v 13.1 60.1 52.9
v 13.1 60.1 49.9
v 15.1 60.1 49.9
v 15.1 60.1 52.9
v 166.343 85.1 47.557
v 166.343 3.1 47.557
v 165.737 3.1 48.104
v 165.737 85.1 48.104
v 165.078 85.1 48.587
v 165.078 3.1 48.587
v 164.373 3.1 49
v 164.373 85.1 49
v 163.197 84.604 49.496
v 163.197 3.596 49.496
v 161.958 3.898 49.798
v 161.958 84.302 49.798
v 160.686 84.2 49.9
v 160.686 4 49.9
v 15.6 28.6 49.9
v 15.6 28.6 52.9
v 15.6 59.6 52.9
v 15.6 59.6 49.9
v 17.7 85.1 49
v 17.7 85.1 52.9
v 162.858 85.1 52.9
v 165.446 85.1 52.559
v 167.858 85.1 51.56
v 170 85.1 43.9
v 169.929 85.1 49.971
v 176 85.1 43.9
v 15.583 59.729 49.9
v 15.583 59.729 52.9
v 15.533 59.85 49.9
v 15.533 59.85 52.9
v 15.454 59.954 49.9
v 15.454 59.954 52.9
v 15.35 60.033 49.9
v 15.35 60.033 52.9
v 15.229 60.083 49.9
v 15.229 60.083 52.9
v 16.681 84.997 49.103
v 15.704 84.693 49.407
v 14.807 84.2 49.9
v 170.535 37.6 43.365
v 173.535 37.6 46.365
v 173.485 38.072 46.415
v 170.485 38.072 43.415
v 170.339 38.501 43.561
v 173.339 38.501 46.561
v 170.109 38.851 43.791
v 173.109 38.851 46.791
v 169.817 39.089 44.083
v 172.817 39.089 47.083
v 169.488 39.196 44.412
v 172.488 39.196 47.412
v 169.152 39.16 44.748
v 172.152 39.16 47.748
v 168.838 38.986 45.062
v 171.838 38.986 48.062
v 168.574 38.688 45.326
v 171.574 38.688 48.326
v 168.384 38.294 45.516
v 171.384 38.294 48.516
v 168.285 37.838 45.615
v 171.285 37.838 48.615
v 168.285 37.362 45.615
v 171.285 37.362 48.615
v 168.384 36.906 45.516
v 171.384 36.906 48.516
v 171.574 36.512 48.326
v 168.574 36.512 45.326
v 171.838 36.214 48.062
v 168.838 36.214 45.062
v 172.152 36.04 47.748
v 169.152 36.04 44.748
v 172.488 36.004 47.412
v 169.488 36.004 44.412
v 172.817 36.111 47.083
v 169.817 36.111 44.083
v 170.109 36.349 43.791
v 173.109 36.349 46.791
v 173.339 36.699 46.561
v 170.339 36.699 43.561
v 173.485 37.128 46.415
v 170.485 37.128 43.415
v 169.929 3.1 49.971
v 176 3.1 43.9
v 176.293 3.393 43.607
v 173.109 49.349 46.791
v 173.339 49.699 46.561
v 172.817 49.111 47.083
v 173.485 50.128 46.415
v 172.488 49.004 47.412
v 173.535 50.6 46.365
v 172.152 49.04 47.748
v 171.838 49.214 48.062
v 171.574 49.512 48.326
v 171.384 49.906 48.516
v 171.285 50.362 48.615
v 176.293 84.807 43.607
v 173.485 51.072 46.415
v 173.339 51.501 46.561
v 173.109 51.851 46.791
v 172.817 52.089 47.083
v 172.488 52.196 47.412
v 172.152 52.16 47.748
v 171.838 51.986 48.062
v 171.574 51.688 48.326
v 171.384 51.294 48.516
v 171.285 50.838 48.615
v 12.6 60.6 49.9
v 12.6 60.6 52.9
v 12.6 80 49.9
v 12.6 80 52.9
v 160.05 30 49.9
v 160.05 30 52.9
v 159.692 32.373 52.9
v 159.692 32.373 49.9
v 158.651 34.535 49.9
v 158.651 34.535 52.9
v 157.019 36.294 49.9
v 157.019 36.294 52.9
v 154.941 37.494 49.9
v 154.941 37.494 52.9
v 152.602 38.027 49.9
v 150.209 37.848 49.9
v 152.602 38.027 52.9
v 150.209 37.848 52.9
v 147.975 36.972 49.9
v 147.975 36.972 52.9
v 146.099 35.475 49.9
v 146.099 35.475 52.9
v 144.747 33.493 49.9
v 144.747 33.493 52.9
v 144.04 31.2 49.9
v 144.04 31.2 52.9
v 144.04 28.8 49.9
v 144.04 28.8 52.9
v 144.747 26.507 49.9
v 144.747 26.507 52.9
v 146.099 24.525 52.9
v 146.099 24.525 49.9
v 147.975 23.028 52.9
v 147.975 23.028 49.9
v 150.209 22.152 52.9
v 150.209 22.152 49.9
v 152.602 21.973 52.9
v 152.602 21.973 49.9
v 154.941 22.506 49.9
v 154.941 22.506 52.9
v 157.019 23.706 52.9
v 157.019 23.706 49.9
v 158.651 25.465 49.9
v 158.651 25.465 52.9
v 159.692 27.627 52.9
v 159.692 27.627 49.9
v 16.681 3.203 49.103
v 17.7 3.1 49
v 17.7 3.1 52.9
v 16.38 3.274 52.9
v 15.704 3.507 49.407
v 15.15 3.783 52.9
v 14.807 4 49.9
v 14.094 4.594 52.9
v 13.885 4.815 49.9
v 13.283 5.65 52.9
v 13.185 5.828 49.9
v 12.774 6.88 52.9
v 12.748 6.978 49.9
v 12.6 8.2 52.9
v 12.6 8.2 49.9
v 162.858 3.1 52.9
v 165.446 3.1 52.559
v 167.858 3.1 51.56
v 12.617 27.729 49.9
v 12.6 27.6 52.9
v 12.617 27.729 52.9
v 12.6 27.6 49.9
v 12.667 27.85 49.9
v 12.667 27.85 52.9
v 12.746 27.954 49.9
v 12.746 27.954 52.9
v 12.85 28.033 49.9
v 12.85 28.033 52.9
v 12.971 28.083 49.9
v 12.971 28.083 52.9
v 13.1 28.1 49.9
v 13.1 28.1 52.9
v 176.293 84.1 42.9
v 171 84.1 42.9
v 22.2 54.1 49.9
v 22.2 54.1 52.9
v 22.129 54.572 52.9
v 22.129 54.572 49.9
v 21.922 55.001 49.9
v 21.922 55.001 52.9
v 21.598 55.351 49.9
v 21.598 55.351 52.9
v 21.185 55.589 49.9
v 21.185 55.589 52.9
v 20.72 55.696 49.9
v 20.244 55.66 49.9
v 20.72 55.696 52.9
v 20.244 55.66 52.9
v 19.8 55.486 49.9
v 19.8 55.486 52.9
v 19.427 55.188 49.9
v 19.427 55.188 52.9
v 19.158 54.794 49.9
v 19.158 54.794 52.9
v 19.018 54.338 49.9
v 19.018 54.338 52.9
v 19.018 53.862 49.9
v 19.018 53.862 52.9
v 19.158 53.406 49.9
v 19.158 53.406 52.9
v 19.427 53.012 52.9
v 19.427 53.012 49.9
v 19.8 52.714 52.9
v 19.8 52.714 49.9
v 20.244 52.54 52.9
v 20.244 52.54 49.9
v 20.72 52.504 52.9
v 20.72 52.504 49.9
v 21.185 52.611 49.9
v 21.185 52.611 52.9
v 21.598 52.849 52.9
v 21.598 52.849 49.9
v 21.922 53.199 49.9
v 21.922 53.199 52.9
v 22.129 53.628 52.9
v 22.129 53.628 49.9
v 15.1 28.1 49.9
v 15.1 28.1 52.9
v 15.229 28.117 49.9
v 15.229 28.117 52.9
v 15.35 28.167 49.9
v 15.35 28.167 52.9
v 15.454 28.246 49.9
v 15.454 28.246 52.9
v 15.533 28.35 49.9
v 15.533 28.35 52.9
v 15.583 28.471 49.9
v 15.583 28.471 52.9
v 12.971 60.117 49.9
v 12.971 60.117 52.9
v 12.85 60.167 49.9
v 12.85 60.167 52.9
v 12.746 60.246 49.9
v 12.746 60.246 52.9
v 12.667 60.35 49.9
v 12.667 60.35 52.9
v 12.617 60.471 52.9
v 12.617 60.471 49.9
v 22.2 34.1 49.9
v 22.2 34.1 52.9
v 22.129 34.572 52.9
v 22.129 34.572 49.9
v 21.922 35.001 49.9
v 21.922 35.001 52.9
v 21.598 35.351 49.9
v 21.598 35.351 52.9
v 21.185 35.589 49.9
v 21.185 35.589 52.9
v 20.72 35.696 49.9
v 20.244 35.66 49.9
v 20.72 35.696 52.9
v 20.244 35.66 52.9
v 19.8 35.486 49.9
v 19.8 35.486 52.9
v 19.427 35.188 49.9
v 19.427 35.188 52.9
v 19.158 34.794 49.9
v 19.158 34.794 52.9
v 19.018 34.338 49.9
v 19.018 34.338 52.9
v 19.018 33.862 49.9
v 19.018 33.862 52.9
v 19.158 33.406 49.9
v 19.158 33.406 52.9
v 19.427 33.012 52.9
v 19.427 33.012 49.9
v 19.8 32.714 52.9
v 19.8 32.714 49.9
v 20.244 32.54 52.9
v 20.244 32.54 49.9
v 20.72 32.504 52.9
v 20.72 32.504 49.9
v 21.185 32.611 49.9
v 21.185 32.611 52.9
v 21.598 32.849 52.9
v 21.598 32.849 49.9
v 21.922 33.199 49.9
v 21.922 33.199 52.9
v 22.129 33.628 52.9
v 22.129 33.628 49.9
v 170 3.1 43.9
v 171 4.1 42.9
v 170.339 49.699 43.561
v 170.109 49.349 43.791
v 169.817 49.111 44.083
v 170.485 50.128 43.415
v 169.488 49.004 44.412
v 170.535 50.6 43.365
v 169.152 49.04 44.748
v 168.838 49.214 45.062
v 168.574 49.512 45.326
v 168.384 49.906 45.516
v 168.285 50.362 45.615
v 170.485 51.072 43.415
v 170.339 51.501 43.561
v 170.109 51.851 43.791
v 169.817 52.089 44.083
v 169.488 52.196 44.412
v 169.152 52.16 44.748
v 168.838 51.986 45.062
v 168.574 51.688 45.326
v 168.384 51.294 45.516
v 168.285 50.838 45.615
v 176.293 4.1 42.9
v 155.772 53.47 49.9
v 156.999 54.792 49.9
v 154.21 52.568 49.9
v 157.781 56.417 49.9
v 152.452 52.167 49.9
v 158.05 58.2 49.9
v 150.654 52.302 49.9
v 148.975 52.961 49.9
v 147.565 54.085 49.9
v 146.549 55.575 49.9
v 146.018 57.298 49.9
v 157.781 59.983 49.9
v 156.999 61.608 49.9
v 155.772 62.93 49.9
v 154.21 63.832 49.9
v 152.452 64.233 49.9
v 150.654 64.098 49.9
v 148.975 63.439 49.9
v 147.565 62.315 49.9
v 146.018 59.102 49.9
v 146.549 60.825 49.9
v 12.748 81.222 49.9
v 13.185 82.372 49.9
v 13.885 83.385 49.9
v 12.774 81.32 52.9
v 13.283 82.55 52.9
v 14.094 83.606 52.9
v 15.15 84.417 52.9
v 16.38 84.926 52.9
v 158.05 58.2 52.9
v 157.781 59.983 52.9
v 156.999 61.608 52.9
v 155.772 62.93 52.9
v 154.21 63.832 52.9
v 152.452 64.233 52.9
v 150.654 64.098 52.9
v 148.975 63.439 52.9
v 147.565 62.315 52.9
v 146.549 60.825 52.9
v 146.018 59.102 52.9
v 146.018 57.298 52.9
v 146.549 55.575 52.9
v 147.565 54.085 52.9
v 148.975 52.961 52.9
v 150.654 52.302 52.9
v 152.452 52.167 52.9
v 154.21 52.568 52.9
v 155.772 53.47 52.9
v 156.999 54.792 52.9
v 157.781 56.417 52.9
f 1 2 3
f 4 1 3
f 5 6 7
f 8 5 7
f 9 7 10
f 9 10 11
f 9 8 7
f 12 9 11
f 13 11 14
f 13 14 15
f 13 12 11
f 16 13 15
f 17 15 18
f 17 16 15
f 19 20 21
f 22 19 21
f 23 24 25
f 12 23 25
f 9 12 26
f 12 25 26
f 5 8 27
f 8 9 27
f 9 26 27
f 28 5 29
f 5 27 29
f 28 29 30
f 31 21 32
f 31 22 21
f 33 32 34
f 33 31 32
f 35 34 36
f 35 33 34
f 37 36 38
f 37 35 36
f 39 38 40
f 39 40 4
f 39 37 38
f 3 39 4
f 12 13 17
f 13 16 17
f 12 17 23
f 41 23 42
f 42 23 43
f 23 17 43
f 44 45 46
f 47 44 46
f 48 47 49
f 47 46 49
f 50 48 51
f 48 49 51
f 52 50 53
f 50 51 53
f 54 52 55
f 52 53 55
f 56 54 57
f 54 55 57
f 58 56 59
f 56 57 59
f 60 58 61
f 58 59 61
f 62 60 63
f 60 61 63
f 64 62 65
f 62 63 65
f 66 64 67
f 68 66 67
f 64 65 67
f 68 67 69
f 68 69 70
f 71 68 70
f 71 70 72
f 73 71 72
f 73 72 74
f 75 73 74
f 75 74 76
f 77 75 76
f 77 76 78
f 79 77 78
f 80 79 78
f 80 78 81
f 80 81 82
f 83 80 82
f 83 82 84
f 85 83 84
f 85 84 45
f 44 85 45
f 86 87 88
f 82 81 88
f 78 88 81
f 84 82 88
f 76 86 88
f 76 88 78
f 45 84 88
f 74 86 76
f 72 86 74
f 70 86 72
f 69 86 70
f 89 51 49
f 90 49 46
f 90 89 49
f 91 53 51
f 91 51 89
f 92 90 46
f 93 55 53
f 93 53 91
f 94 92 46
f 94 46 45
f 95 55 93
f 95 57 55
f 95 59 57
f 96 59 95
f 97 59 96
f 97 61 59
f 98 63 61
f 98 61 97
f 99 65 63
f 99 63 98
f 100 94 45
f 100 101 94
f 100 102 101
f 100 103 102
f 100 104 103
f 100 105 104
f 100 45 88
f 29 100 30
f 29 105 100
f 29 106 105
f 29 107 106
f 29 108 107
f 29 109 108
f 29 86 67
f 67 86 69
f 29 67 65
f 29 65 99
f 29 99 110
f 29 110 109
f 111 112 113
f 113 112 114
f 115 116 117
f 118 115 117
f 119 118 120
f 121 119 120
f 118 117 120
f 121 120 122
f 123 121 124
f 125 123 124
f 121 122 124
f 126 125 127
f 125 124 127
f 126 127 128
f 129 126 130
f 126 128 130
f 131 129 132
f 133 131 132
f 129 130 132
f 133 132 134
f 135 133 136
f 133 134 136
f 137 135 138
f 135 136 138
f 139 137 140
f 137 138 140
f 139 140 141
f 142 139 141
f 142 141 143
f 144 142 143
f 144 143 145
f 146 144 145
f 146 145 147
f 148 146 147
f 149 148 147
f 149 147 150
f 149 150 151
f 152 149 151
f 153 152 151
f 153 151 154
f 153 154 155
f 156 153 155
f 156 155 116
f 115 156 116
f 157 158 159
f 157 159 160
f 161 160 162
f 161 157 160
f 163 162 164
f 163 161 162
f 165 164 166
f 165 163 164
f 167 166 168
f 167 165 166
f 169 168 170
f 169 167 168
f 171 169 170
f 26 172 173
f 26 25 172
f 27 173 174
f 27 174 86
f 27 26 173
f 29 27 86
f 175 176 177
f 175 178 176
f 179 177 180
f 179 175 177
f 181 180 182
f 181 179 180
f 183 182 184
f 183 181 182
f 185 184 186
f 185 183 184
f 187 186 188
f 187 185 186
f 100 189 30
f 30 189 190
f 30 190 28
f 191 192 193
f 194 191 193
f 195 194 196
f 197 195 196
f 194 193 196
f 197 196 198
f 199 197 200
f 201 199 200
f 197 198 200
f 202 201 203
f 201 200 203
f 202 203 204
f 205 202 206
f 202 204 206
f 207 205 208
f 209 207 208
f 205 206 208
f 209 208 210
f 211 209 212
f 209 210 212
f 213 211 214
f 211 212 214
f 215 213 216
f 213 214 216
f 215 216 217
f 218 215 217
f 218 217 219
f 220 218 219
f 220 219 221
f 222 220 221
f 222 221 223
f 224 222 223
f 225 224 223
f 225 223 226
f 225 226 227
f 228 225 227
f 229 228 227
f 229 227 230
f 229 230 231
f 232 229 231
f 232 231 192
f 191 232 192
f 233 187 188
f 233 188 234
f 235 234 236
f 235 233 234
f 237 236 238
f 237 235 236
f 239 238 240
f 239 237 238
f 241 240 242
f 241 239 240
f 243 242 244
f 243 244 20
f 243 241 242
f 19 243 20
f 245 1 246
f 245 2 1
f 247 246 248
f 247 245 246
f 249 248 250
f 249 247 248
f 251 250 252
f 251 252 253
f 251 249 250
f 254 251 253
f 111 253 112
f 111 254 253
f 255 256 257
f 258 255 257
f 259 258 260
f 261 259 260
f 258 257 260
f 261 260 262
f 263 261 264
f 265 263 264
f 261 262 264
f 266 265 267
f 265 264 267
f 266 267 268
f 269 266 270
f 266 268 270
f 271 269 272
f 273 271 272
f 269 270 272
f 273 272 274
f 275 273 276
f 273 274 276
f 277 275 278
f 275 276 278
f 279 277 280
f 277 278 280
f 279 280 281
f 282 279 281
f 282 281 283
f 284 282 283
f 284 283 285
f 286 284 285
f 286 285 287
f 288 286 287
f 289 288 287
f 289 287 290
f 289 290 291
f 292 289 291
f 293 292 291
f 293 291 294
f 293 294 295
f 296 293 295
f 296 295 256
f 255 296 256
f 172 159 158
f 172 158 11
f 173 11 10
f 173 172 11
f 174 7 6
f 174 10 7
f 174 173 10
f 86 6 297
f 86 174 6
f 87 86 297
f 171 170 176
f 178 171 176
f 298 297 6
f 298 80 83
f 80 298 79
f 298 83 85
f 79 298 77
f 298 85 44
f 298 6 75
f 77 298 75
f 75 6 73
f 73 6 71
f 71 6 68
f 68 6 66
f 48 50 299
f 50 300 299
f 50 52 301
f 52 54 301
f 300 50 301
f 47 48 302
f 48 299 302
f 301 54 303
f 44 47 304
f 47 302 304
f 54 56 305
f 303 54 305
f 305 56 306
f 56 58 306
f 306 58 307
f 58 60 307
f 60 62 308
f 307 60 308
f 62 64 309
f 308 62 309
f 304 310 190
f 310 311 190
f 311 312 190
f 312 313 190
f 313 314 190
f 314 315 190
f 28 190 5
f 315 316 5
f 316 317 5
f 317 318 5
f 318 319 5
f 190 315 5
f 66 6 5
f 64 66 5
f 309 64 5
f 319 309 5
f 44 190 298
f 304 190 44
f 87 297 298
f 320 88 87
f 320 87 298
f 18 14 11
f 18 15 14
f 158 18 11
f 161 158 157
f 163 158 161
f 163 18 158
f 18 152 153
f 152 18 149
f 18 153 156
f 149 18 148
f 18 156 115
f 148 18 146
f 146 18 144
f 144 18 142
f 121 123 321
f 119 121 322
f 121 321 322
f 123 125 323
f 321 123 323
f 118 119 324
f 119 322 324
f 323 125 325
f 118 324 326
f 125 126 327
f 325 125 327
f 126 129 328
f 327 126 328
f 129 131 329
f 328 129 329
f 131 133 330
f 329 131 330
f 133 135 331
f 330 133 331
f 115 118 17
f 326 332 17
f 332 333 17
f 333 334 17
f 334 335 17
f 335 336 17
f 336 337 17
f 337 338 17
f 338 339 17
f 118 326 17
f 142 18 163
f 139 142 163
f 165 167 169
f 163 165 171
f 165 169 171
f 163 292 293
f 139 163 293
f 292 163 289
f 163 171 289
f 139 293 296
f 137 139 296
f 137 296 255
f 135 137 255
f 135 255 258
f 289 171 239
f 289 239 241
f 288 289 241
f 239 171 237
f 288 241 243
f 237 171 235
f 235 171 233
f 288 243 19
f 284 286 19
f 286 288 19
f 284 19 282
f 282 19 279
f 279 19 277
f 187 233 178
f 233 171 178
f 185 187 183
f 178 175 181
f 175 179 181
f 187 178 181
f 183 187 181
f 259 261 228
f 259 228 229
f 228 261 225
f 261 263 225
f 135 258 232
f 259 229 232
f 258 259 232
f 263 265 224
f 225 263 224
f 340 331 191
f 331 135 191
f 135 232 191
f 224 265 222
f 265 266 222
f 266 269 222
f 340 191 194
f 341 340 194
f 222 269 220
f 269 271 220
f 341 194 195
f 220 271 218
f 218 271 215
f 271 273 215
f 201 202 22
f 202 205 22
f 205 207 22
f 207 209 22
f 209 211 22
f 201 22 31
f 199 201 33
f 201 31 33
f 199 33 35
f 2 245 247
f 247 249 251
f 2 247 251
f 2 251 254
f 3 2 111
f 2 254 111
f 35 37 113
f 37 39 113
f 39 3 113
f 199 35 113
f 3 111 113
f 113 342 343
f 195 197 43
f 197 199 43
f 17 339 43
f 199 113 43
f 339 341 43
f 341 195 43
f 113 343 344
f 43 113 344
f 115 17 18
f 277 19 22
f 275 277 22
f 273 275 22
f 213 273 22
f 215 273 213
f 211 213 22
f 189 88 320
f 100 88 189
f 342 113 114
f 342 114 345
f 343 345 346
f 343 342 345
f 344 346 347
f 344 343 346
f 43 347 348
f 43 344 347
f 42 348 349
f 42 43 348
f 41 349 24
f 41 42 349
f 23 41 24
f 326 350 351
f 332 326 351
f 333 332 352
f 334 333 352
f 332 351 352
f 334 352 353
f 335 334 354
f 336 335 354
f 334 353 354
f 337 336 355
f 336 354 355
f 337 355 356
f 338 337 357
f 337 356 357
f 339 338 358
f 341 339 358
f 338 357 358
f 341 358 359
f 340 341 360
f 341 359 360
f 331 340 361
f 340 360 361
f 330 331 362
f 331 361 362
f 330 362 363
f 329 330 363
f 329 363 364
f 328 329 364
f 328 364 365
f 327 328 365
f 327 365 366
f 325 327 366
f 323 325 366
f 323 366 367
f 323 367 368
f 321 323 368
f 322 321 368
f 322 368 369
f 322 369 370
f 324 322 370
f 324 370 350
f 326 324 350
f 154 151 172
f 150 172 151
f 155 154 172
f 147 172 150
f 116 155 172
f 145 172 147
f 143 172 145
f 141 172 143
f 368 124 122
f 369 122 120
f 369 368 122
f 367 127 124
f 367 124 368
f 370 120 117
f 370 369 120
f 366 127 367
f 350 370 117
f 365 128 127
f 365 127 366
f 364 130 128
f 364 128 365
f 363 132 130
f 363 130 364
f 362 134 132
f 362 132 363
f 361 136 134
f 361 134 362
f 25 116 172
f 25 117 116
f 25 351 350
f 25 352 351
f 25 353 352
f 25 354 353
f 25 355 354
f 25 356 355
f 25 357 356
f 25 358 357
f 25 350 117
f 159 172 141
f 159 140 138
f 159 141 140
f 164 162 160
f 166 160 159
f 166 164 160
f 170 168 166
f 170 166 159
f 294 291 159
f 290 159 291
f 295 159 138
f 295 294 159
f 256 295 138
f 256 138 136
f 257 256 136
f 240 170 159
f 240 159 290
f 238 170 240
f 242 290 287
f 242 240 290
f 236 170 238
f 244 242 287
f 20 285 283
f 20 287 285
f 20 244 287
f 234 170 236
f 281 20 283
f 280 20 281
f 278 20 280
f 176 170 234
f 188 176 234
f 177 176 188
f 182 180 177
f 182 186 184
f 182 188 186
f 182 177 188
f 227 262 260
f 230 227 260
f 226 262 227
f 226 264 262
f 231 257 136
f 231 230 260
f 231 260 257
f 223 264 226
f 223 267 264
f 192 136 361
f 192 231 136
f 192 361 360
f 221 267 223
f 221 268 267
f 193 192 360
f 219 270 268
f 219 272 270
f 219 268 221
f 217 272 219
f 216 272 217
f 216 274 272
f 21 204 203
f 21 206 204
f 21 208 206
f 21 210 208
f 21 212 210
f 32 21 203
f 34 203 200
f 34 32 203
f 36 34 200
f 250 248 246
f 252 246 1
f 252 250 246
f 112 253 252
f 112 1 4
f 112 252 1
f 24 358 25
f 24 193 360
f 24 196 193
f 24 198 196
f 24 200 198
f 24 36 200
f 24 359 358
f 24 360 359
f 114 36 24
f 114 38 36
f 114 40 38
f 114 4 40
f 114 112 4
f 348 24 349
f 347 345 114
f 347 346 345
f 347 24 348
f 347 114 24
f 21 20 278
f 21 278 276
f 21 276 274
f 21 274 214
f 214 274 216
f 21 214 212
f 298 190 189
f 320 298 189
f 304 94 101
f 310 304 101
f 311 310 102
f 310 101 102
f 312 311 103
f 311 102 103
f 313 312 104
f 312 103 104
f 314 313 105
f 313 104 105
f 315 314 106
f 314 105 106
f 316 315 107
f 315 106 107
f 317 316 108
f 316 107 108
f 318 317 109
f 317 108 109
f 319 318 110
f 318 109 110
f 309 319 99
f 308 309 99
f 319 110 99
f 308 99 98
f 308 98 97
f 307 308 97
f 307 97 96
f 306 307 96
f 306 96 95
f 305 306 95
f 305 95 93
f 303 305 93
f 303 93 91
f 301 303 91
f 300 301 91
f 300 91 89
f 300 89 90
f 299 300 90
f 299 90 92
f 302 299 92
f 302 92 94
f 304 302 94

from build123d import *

# Parameters (mm, degrees)
SKETCH_1_W            = 88.2
SKETCH_1_H            = 177
EXTRUDE_1_DEPTH       = 52.9
SHELL_1_T             = -3
CUT_EXTRUDE_5_REACH   = 206.711
SKETCH_16_R           = 6.05
SKETCH_16_R_2         = 8.05
CHAMFER_7_SIZE        = 10
CHAMFER_8_SIZE        = 1
SKETCH_21_W           = 10.5
SKETCH_21_H           = 82.2
EXTRUDE_7_DEPTH       = 6
SKETCH_22_OUTSIDE_W   = 219.942
SKETCH_22_OUTSIDE_H   = 131.142
SKETCH_22_OUTSIDE_W_2 = 164.4
SKETCH_22_OUTSIDE_H_2 = 82
CUT_EXTRUDE_8_DEPTH   = 10
SKETCH_23_W           = 177
SKETCH_23_H           = 42.9
CUT_EXTRUDE_9_DEPTH   = 205.711137948
FILLET_3_R            = 10
FILLET_4_R            = 5.1
SKETCH_24_R           = 1.6
CUT_EXTRUDE_10_DEPTH  = 146.652789194
CHAMFER_10_SIZE       = 1
CHAMFER_10_SIZE_2     = 0.707106781
CUT_EXTRUDE_11_REACH  = 198.013
SKETCH_25_R           = 1.6
FILLET_5_R            = 8
CUT_EXTRUDE_12_REACH  = 198.013
SKETCH_26_W           = 3
SKETCH_26_H           = 32
FILLET_6_R            = 0.5


with BuildPart() as part:
    # 草图1 → 凸台-拉伸1 (new body)
    with BuildSketch(Plane(origin=(0, 0, 0), x_dir=(0, 1, 0), z_dir=(0, 0, 1))):
        with Locations((44.1, -88.5)):
            Rectangle(SKETCH_1_W, SKETCH_1_H)
    extrude(amount=EXTRUDE_1_DEPTH)

    # 抽壳1
    shell_1_openings = [part.faces().sort_by_distance(p)[0] for p in [
        (88.5, 44.1, 0),
    ]]
    offset(amount=SHELL_1_T, openings=shell_1_openings, kind=Kind.INTERSECTION)

    # 草图16 → 切除-拉伸5 (cut, up to next)
    with BuildSketch(Plane.XY.offset(52.9), mode=Mode.PRIVATE) as cut_extrude_5_sk1:
        with Locations((152, 58.2)):
            Circle(SKETCH_16_R)
    cut_extrude_5_tool1 = extrude(cut_extrude_5_sk1.sketch, amount=-CUT_EXTRUDE_5_REACH, mode=Mode.PRIVATE) & part.part
    # 草图16 → 切除-拉伸5 (cut, up to next)
    with BuildSketch(Plane.XY.offset(52.9), mode=Mode.PRIVATE) as cut_extrude_5_sk2:
        with Locations((152, 30)):
            Circle(SKETCH_16_R_2)
    cut_extrude_5_tool2 = extrude(cut_extrude_5_sk2.sketch, amount=-CUT_EXTRUDE_5_REACH, mode=Mode.PRIVATE) & part.part
    add(cut_extrude_5_tool1.solids().sort_by_distance((152, 58.2, 52.9))[0], mode=Mode.SUBTRACT)
    add(cut_extrude_5_tool2.solids().sort_by_distance((152, 30, 52.9))[0], mode=Mode.SUBTRACT)

    # 倒角7
    chamfer_7_edges = [part.edges().sort_by_distance(p)[0] for p in [
        (174, 44.1, 49.9),
        (177, 44.1, 52.9),
    ]]
    chamfer(chamfer_7_edges, length=CHAMFER_7_SIZE)

    # 倒角8
    chamfer_8_edges = [part.edges().sort_by_distance(p)[0] for p in [
        (83.5, 3, 49.9),
        (83.5, 88.2, 52.9),
        (177, 88.2, 21.45),
        (172, 88.2, 47.9),
        (177, 0, 21.45),
        (172, 0, 47.9),
        (83.5, 85.2, 49.9),
        (83.5, 0, 52.9),
    ]]
    chamfer(chamfer_8_edges, length=CHAMFER_8_SIZE)

    # 草图21 → 凸台-拉伸7 (add)
    with BuildSketch(Plane(origin=(0, 0, 0), x_dir=(-1, 0, 0), z_dir=(0, 0, -1))):
        with Locations((-168.75, 44.1)):
            Rectangle(SKETCH_21_W, SKETCH_21_H)
        with Locations((-8.25, 44.1)):
            Rectangle(SKETCH_21_W, SKETCH_21_H)
    extrude(amount=-EXTRUDE_7_DEPTH)

    # 草图22 outside → 切除-拉伸8 (cut)
    with BuildSketch(Plane.XY.offset(52.9)):
        with Locations((88.5, 44.1)):
            Rectangle(SKETCH_22_OUTSIDE_W, SKETCH_22_OUTSIDE_H)
        with Locations((94.8, 44.1)):
            Rectangle(SKETCH_22_OUTSIDE_W_2, SKETCH_22_OUTSIDE_H_2, mode=Mode.SUBTRACT)
    extrude(amount=-CUT_EXTRUDE_8_DEPTH, mode=Mode.SUBTRACT)

    # 草图23 → 切除-拉伸9 (cut, through all)
    with BuildSketch(Plane.XZ):
        with Locations((88.5, 21.45)):
            Rectangle(SKETCH_23_W, SKETCH_23_H)
    extrude(amount=-CUT_EXTRUDE_9_DEPTH, mode=Mode.SUBTRACT)

    # 圆角3
    fillet_3_edges = [part.edges().sort_by_distance(p)[0] for p in [
        (167, 44.1, 52.9),
    ]]
    fillet(fillet_3_edges, radius=FILLET_3_R)

    # 圆角4
    fillet_4_edges = [part.edges().sort_by_distance(p)[0] for p in [
        (12.6, 3.1, 50.95),
        (12.6, 85.1, 50.95),
    ]]
    fillet(fillet_4_edges, radius=FILLET_4_R)

    # 草图24 → 切除-拉伸10 (cut, through all)
    with BuildSketch(Plane(origin=(109.95, 0, 109.95), x_dir=(0.7071067811865456, 0, -0.7071067811865495), z_dir=(0.7071067811865495, 0, 0.7071067811865456))):
        with Locations((88.323019357, 50.6)):
            Circle(SKETCH_24_R)
        with Locations((88.323019357, 37.6)):
            Circle(SKETCH_24_R)
    extrude(amount=-CUT_EXTRUDE_10_DEPTH, mode=Mode.SUBTRACT)

    # 倒角10
    # the kernel refuses this chamfer: 1, 0.707106781 mm, written as the material it takes off along each edge
    with BuildSketch(Plane(origin=(177, 87.671682988, 42.9), x_dir=(-0.6873969152646486, 0, 0.7262819568766976), z_dir=(0, -1, 0))) as chamfer_10_piece_1:
        Polygon((CHAMFER_10_SIZE * 0.999621916911, CHAMFER_10_SIZE * 0.0274958766106), (CHAMFER_10_SIZE_2 * 0.687396915446, CHAMFER_10_SIZE_2 * 0.726281957068), (0, 0), align=None)
    extrude(amount=87.143365976, mode=Mode.SUBTRACT)
    with BuildSketch(Plane(origin=(179.571682988, 3.1, 42.9), x_dir=(0, -0.027495876610586414, 0.9996219169112968), z_dir=(-1, 0, 0))) as chamfer_10_piece_2:
        Polygon((CHAMFER_10_SIZE * 0.999621916911, CHAMFER_10_SIZE * 0.0274958766106), (-CHAMFER_10_SIZE * 0.0274958766106, CHAMFER_10_SIZE * 0.999621916911), (0, 0), align=None)
    extrude(amount=11.143365976, mode=Mode.SUBTRACT)
    with BuildSketch(Plane(origin=(168.428317012, 85.1, 42.9), x_dir=(0, -0.9996219169112968, -0.027495876610589196), z_dir=(1, 0, 0))) as chamfer_10_piece_3:
        Polygon((CHAMFER_10_SIZE * 0.999621916911, -CHAMFER_10_SIZE * 0.0274958766106), (-CHAMFER_10_SIZE * 0.0274958766106, -CHAMFER_10_SIZE * 0.999621916911), (0, 0), align=None)
    extrude(amount=11.143365976, mode=Mode.SUBTRACT)

    # 草图25 → 切除-拉伸11 (cut, up to next)
    with BuildSketch(Plane.XY.offset(52.9), mode=Mode.PRIVATE) as cut_extrude_11_sk1:
        with Locations((20.6, 54.1)):
            Circle(SKETCH_25_R)
    cut_extrude_11_tool1 = extrude(cut_extrude_11_sk1.sketch, amount=-CUT_EXTRUDE_11_REACH, mode=Mode.PRIVATE) & part.part
    # 草图25 → 切除-拉伸11 (cut, up to next)
    with BuildSketch(Plane.XY.offset(52.9), mode=Mode.PRIVATE) as cut_extrude_11_sk2:
        with Locations((20.6, 34.1)):
            Circle(SKETCH_25_R)
    cut_extrude_11_tool2 = extrude(cut_extrude_11_sk2.sketch, amount=-CUT_EXTRUDE_11_REACH, mode=Mode.PRIVATE) & part.part
    add(cut_extrude_11_tool1.solids().sort_by_distance((20.6, 54.1, 52.9))[0], mode=Mode.SUBTRACT)
    add(cut_extrude_11_tool2.solids().sort_by_distance((20.6, 34.1, 52.9))[0], mode=Mode.SUBTRACT)

    # 圆角5
    fillet_5_edges = [part.edges().sort_by_distance(p)[0] for p in [
        (164, 44.1, 49.9),
    ]]
    fillet(fillet_5_edges, radius=FILLET_5_R)

    # 草图26 → 切除-拉伸12 (cut, up to next)
    with BuildSketch(Plane.XY.offset(52.9), mode=Mode.PRIVATE) as cut_extrude_12_sk1:
        with Locations((14.1, 44.1)):
            Rectangle(SKETCH_26_W, SKETCH_26_H)
    cut_extrude_12_tool1 = extrude(cut_extrude_12_sk1.sketch, amount=-CUT_EXTRUDE_12_REACH, mode=Mode.PRIVATE) & part.part
    add(cut_extrude_12_tool1.solids().sort_by_distance((14.1, 44.1, 52.9))[0], mode=Mode.SUBTRACT)

    # 圆角6
    fillet_6_edges = [part.edges().sort_by_distance(p)[0] for p in [
        (12.6, 28.1, 51.4),
        (12.6, 60.1, 51.4),
        (15.6, 60.1, 51.4),
        (15.6, 28.1, 51.4),
    ]]
    fillet(fillet_6_edges, radius=FILLET_6_R)


solid = part.part
